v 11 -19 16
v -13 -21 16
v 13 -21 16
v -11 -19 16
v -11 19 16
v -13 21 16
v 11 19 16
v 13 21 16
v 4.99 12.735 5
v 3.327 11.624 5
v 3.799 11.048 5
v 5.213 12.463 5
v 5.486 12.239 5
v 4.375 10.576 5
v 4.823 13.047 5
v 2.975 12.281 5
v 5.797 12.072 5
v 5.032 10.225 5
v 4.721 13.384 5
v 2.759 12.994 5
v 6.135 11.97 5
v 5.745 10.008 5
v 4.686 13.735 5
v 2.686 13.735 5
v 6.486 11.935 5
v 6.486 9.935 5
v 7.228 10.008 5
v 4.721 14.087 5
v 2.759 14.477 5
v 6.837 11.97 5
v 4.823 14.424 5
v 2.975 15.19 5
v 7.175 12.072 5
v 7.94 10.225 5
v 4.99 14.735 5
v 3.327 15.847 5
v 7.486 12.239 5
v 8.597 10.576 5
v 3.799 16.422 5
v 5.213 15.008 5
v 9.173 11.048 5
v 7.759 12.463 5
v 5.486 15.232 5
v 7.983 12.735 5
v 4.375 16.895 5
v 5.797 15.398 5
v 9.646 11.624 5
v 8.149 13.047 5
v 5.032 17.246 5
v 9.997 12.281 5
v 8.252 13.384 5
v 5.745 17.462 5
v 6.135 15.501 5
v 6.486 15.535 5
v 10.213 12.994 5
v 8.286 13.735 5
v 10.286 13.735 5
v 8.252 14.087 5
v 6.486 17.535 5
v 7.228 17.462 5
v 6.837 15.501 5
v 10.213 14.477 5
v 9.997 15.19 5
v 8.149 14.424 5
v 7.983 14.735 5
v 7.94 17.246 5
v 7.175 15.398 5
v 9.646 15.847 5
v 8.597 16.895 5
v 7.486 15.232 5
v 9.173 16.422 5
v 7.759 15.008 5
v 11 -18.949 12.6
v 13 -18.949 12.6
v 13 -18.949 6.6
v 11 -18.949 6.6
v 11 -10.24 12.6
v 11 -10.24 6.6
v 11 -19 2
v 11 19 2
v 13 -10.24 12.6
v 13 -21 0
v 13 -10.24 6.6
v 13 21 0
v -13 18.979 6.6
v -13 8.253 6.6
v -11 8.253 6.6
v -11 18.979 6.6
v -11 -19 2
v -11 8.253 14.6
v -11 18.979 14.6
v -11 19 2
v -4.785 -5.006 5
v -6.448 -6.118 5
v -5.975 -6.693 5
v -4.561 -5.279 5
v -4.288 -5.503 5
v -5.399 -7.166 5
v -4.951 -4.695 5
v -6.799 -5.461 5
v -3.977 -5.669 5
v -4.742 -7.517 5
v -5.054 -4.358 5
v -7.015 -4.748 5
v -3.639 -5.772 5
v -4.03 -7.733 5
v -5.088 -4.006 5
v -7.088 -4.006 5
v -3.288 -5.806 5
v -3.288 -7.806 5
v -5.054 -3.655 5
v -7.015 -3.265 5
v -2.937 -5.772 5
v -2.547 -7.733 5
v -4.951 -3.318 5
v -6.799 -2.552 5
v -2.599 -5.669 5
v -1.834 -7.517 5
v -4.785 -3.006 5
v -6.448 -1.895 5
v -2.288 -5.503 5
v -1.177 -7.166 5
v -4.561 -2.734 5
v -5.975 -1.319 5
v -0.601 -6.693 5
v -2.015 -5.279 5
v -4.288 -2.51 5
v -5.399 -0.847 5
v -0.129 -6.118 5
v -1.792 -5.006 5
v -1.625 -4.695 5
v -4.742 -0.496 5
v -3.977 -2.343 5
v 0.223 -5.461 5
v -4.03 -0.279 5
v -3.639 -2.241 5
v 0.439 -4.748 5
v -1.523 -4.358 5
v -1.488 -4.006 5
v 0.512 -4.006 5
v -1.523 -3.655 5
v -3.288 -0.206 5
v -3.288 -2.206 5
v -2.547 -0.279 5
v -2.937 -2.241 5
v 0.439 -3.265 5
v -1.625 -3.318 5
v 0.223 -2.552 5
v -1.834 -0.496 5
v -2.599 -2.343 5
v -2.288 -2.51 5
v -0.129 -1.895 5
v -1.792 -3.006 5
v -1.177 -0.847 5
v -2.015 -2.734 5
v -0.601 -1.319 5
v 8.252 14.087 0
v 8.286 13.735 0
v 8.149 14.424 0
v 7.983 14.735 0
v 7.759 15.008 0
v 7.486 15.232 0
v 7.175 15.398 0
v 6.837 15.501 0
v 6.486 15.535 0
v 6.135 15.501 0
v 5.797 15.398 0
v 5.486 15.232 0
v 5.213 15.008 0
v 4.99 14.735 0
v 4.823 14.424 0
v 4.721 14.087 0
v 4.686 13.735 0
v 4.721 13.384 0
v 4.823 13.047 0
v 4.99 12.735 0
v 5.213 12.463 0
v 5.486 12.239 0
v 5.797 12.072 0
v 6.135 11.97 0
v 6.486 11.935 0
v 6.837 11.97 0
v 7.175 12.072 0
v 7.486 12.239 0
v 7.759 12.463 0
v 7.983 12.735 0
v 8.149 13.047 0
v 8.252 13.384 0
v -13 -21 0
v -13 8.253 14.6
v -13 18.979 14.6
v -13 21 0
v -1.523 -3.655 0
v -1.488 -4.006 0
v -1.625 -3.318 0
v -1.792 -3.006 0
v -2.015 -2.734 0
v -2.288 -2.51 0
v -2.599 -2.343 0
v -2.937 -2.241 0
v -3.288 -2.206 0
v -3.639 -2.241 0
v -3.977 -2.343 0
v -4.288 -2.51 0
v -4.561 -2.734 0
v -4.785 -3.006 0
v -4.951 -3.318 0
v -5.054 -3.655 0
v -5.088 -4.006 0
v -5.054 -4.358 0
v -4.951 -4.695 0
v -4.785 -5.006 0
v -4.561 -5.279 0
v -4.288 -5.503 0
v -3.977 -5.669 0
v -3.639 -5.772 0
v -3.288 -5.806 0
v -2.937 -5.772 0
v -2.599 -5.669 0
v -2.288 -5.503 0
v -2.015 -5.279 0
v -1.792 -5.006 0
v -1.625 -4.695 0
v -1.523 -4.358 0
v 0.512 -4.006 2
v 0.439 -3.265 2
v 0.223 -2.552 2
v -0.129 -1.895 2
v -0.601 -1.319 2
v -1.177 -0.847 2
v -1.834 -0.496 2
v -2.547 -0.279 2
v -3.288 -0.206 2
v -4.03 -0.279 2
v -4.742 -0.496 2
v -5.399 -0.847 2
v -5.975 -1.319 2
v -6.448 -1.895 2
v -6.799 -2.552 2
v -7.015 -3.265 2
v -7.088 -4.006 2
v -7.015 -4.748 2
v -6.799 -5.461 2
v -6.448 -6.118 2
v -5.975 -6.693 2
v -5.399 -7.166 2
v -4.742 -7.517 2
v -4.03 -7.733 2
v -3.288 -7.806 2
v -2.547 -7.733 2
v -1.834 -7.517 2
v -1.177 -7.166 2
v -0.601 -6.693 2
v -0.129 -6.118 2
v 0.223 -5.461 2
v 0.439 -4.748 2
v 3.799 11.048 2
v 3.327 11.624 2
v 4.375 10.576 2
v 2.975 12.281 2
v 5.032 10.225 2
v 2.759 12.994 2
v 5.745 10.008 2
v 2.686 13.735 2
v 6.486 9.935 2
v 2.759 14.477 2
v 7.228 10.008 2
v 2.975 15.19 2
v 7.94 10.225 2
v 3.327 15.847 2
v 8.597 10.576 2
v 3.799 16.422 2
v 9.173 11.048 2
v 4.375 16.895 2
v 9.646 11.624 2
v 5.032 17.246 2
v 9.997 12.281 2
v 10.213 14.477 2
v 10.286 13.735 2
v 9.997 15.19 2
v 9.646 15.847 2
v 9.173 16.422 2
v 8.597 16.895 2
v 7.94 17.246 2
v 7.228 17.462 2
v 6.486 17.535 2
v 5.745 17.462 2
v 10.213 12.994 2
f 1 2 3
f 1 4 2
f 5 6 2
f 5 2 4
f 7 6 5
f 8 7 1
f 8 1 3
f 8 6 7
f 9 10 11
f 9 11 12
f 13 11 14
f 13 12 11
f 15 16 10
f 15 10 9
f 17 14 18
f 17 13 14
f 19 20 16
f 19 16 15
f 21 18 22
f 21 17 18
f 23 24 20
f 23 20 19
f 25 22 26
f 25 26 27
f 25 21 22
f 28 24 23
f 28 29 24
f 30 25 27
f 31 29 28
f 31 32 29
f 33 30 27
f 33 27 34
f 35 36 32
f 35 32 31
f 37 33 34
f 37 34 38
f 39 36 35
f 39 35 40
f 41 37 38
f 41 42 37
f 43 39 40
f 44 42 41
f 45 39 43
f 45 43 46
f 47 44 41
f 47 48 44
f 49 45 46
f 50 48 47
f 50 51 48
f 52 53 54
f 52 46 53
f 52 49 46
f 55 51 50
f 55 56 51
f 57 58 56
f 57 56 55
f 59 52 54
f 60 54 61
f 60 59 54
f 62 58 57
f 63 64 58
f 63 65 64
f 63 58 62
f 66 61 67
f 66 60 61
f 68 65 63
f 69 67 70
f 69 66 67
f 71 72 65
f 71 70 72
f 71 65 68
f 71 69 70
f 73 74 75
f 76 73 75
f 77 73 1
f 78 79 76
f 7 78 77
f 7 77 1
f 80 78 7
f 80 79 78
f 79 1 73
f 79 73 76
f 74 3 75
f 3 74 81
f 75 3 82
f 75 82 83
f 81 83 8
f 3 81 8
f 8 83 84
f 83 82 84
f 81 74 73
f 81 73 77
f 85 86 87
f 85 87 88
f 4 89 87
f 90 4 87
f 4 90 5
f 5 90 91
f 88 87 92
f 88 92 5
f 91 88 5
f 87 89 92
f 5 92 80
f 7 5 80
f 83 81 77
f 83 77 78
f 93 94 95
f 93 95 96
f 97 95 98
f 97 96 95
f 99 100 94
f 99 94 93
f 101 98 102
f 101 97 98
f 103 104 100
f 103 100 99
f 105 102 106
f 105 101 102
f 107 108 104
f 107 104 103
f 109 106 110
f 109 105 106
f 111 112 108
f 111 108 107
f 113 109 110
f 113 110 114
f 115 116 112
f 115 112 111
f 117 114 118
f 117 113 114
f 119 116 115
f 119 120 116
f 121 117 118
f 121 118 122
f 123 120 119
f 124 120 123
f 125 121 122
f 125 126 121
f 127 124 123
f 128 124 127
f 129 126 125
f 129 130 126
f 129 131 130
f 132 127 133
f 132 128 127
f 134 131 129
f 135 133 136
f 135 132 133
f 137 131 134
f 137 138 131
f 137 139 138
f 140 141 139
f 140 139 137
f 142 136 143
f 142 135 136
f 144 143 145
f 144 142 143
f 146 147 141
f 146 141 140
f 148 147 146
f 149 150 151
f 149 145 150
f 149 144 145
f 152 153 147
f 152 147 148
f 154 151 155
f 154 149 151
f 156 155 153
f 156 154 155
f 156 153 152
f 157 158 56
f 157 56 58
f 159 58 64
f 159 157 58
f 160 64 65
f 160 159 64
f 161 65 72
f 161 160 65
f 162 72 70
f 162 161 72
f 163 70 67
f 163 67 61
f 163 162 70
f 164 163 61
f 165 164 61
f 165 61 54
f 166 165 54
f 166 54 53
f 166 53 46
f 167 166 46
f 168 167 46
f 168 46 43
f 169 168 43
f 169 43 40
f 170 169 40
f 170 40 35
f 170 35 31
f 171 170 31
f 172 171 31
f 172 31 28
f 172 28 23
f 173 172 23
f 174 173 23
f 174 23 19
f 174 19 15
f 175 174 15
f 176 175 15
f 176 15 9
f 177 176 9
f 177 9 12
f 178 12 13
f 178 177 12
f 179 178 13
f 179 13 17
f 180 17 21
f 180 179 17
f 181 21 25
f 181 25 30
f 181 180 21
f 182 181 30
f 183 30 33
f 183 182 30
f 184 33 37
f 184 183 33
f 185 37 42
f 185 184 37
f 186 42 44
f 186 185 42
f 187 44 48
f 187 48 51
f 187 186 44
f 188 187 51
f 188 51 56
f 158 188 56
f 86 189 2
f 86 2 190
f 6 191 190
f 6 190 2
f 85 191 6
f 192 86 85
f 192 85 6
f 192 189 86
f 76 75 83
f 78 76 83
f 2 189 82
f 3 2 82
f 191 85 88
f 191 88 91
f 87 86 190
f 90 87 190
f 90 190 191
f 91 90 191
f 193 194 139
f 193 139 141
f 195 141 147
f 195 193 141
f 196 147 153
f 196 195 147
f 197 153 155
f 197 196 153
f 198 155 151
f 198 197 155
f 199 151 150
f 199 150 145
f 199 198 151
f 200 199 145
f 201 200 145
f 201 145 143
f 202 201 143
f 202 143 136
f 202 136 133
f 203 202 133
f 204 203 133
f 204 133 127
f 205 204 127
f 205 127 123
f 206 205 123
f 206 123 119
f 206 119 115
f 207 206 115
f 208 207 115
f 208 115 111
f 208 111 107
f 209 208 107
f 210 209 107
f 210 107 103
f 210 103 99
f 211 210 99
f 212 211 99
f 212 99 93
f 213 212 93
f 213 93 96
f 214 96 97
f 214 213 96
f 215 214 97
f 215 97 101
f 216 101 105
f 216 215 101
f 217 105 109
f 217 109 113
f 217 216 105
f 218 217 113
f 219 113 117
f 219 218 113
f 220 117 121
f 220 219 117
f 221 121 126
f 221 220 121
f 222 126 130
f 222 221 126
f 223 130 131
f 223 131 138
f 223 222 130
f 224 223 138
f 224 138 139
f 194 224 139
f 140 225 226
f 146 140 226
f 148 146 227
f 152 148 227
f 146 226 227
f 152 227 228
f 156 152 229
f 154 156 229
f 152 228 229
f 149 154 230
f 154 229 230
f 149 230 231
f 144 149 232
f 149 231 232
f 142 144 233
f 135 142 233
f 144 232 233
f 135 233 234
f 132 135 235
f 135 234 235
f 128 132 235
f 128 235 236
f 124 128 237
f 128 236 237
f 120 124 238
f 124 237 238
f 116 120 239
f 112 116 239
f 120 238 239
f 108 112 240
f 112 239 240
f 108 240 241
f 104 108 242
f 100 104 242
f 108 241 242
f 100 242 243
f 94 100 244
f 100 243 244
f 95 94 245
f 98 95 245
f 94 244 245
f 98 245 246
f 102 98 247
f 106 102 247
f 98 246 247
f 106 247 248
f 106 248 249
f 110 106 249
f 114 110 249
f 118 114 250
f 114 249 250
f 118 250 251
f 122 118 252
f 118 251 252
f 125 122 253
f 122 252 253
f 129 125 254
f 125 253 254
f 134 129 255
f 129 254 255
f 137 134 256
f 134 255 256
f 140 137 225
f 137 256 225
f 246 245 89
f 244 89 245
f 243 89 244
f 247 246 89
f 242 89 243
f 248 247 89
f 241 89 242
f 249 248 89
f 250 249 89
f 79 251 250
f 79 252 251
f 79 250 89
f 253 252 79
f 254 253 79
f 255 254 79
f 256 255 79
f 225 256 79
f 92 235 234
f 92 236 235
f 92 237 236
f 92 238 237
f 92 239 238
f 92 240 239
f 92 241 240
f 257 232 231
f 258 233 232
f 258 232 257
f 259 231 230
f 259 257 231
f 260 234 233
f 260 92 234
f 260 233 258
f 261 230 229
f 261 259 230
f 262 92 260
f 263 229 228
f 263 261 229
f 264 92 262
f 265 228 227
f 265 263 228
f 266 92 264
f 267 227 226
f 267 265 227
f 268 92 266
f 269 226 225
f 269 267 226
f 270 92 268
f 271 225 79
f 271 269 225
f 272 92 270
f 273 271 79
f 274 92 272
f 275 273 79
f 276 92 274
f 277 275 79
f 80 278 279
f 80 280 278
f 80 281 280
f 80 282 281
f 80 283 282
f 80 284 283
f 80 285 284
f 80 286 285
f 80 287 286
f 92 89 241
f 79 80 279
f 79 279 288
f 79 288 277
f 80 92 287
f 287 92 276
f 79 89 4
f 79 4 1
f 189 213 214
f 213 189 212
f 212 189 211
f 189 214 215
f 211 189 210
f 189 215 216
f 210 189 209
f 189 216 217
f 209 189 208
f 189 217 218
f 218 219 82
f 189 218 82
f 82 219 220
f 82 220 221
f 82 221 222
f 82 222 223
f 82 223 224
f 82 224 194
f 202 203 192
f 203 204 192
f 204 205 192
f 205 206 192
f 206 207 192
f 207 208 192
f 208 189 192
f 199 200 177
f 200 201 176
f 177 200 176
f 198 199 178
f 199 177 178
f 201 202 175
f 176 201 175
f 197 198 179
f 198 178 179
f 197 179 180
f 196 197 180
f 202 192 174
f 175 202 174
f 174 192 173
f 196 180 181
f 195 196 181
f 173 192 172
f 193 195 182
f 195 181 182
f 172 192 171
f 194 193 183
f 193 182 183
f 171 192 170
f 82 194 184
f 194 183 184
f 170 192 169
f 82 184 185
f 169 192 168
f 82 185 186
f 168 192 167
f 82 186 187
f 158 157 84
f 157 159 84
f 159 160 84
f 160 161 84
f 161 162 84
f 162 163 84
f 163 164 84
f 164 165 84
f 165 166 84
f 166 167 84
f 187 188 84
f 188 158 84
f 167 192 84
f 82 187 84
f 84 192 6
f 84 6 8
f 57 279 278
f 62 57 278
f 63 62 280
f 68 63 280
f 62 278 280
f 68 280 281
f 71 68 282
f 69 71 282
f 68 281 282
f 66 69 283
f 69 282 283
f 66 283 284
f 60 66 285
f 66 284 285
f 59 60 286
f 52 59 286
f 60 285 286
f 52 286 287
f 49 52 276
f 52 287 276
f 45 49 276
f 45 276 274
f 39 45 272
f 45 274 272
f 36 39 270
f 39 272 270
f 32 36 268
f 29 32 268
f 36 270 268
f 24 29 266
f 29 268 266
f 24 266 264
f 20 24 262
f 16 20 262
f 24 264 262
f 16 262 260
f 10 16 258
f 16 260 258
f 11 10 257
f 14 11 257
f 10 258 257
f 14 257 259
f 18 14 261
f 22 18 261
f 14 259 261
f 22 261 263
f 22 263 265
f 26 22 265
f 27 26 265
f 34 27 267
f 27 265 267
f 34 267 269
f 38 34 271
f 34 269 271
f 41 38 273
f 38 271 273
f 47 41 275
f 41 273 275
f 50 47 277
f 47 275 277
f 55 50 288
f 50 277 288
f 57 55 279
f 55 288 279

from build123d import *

# Parameters (mm, degrees)
SKETCH1_W           = 26
SKETCH1_H           = 42
BOSS_EXTRUDE1_DEPTH = 16
SHELL1_T            = -2
SKETCH2_R           = 3.8
SKETCH2_R_2         = 1.8
BOSS_EXTRUDE2_DEPTH = 3
CUT_EXTRUDE2_START  = -2
SKETCH2_2_R         = 1.8
CUT_EXTRUDE2_DEPTH  = 2
SKETCH4_W           = 8
SKETCH4_H           = 10.725495138
CUT_EXTRUDE3_DEPTH  = 2
SKETCH5_W           = 6
SKETCH5_H           = 8.708980209
CUT_EXTRUDE4_DEPTH  = 2


with BuildPart() as part:
    # Sketch1 → Boss-Extrude1 (new body)
    with BuildSketch(Plane.XY):
        Rectangle(SKETCH1_W, SKETCH1_H)
    extrude(amount=BOSS_EXTRUDE1_DEPTH)

    # Shell1
    shell1_openings = [part.faces().sort_by_distance(p)[0] for p in [
        (0, 0, 16),
    ]]
    offset(amount=SHELL1_T, openings=shell1_openings, kind=Kind.INTERSECTION)

    # Sketch2 → Boss-Extrude2 (add)
    # profile 1 of 2: a face of its own
    with BuildSketch(Plane.XY.offset(2)):
        with Locations((-3.288169065, -4.006418736)):
            Circle(SKETCH2_R)
        with Locations((-3.288169065, -4.006418736)):
            Circle(SKETCH2_R_2, mode=Mode.SUBTRACT)
    # profile 2 of 2: a face of its own
    with BuildSketch(Plane.XY.offset(2)):
        with Locations((6.486240627, 13.735356113)):
            Circle(SKETCH2_R)
        with Locations((6.486240627, 13.735356113)):
            Circle(SKETCH2_R_2, mode=Mode.SUBTRACT)
    extrude(amount=BOSS_EXTRUDE2_DEPTH)

    # Sketch2<2> → Cut-Extrude2 (cut)
    with BuildSketch(Plane.XY.offset(2).offset(CUT_EXTRUDE2_START)):
        with Locations((6.486240627, 13.735356113)):
            Circle(SKETCH2_2_R)
        with Locations((-3.288169065, -4.006418736)):
            Circle(SKETCH2_2_R)
    extrude(amount=CUT_EXTRUDE2_DEPTH, mode=Mode.SUBTRACT)

    # Sketch4 → Cut-Extrude3 (cut)
    with BuildSketch(Plane.ZY.offset(13)):
        with Locations((10.6, 13.616095809)):
            Rectangle(SKETCH4_W, SKETCH4_H)
    extrude(amount=-CUT_EXTRUDE3_DEPTH, mode=Mode.SUBTRACT)

    # Sketch5 → Cut-Extrude4 (cut)
    with BuildSketch(Plane(origin=(13, 0, 0), x_dir=(0, 0, -1), z_dir=(1, 0, 0))):
        with Locations((-9.6, -14.594189668)):
            Rectangle(SKETCH5_W, SKETCH5_H)
    extrude(amount=-CUT_EXTRUDE4_DEPTH, mode=Mode.SUBTRACT)


solid = part.part
